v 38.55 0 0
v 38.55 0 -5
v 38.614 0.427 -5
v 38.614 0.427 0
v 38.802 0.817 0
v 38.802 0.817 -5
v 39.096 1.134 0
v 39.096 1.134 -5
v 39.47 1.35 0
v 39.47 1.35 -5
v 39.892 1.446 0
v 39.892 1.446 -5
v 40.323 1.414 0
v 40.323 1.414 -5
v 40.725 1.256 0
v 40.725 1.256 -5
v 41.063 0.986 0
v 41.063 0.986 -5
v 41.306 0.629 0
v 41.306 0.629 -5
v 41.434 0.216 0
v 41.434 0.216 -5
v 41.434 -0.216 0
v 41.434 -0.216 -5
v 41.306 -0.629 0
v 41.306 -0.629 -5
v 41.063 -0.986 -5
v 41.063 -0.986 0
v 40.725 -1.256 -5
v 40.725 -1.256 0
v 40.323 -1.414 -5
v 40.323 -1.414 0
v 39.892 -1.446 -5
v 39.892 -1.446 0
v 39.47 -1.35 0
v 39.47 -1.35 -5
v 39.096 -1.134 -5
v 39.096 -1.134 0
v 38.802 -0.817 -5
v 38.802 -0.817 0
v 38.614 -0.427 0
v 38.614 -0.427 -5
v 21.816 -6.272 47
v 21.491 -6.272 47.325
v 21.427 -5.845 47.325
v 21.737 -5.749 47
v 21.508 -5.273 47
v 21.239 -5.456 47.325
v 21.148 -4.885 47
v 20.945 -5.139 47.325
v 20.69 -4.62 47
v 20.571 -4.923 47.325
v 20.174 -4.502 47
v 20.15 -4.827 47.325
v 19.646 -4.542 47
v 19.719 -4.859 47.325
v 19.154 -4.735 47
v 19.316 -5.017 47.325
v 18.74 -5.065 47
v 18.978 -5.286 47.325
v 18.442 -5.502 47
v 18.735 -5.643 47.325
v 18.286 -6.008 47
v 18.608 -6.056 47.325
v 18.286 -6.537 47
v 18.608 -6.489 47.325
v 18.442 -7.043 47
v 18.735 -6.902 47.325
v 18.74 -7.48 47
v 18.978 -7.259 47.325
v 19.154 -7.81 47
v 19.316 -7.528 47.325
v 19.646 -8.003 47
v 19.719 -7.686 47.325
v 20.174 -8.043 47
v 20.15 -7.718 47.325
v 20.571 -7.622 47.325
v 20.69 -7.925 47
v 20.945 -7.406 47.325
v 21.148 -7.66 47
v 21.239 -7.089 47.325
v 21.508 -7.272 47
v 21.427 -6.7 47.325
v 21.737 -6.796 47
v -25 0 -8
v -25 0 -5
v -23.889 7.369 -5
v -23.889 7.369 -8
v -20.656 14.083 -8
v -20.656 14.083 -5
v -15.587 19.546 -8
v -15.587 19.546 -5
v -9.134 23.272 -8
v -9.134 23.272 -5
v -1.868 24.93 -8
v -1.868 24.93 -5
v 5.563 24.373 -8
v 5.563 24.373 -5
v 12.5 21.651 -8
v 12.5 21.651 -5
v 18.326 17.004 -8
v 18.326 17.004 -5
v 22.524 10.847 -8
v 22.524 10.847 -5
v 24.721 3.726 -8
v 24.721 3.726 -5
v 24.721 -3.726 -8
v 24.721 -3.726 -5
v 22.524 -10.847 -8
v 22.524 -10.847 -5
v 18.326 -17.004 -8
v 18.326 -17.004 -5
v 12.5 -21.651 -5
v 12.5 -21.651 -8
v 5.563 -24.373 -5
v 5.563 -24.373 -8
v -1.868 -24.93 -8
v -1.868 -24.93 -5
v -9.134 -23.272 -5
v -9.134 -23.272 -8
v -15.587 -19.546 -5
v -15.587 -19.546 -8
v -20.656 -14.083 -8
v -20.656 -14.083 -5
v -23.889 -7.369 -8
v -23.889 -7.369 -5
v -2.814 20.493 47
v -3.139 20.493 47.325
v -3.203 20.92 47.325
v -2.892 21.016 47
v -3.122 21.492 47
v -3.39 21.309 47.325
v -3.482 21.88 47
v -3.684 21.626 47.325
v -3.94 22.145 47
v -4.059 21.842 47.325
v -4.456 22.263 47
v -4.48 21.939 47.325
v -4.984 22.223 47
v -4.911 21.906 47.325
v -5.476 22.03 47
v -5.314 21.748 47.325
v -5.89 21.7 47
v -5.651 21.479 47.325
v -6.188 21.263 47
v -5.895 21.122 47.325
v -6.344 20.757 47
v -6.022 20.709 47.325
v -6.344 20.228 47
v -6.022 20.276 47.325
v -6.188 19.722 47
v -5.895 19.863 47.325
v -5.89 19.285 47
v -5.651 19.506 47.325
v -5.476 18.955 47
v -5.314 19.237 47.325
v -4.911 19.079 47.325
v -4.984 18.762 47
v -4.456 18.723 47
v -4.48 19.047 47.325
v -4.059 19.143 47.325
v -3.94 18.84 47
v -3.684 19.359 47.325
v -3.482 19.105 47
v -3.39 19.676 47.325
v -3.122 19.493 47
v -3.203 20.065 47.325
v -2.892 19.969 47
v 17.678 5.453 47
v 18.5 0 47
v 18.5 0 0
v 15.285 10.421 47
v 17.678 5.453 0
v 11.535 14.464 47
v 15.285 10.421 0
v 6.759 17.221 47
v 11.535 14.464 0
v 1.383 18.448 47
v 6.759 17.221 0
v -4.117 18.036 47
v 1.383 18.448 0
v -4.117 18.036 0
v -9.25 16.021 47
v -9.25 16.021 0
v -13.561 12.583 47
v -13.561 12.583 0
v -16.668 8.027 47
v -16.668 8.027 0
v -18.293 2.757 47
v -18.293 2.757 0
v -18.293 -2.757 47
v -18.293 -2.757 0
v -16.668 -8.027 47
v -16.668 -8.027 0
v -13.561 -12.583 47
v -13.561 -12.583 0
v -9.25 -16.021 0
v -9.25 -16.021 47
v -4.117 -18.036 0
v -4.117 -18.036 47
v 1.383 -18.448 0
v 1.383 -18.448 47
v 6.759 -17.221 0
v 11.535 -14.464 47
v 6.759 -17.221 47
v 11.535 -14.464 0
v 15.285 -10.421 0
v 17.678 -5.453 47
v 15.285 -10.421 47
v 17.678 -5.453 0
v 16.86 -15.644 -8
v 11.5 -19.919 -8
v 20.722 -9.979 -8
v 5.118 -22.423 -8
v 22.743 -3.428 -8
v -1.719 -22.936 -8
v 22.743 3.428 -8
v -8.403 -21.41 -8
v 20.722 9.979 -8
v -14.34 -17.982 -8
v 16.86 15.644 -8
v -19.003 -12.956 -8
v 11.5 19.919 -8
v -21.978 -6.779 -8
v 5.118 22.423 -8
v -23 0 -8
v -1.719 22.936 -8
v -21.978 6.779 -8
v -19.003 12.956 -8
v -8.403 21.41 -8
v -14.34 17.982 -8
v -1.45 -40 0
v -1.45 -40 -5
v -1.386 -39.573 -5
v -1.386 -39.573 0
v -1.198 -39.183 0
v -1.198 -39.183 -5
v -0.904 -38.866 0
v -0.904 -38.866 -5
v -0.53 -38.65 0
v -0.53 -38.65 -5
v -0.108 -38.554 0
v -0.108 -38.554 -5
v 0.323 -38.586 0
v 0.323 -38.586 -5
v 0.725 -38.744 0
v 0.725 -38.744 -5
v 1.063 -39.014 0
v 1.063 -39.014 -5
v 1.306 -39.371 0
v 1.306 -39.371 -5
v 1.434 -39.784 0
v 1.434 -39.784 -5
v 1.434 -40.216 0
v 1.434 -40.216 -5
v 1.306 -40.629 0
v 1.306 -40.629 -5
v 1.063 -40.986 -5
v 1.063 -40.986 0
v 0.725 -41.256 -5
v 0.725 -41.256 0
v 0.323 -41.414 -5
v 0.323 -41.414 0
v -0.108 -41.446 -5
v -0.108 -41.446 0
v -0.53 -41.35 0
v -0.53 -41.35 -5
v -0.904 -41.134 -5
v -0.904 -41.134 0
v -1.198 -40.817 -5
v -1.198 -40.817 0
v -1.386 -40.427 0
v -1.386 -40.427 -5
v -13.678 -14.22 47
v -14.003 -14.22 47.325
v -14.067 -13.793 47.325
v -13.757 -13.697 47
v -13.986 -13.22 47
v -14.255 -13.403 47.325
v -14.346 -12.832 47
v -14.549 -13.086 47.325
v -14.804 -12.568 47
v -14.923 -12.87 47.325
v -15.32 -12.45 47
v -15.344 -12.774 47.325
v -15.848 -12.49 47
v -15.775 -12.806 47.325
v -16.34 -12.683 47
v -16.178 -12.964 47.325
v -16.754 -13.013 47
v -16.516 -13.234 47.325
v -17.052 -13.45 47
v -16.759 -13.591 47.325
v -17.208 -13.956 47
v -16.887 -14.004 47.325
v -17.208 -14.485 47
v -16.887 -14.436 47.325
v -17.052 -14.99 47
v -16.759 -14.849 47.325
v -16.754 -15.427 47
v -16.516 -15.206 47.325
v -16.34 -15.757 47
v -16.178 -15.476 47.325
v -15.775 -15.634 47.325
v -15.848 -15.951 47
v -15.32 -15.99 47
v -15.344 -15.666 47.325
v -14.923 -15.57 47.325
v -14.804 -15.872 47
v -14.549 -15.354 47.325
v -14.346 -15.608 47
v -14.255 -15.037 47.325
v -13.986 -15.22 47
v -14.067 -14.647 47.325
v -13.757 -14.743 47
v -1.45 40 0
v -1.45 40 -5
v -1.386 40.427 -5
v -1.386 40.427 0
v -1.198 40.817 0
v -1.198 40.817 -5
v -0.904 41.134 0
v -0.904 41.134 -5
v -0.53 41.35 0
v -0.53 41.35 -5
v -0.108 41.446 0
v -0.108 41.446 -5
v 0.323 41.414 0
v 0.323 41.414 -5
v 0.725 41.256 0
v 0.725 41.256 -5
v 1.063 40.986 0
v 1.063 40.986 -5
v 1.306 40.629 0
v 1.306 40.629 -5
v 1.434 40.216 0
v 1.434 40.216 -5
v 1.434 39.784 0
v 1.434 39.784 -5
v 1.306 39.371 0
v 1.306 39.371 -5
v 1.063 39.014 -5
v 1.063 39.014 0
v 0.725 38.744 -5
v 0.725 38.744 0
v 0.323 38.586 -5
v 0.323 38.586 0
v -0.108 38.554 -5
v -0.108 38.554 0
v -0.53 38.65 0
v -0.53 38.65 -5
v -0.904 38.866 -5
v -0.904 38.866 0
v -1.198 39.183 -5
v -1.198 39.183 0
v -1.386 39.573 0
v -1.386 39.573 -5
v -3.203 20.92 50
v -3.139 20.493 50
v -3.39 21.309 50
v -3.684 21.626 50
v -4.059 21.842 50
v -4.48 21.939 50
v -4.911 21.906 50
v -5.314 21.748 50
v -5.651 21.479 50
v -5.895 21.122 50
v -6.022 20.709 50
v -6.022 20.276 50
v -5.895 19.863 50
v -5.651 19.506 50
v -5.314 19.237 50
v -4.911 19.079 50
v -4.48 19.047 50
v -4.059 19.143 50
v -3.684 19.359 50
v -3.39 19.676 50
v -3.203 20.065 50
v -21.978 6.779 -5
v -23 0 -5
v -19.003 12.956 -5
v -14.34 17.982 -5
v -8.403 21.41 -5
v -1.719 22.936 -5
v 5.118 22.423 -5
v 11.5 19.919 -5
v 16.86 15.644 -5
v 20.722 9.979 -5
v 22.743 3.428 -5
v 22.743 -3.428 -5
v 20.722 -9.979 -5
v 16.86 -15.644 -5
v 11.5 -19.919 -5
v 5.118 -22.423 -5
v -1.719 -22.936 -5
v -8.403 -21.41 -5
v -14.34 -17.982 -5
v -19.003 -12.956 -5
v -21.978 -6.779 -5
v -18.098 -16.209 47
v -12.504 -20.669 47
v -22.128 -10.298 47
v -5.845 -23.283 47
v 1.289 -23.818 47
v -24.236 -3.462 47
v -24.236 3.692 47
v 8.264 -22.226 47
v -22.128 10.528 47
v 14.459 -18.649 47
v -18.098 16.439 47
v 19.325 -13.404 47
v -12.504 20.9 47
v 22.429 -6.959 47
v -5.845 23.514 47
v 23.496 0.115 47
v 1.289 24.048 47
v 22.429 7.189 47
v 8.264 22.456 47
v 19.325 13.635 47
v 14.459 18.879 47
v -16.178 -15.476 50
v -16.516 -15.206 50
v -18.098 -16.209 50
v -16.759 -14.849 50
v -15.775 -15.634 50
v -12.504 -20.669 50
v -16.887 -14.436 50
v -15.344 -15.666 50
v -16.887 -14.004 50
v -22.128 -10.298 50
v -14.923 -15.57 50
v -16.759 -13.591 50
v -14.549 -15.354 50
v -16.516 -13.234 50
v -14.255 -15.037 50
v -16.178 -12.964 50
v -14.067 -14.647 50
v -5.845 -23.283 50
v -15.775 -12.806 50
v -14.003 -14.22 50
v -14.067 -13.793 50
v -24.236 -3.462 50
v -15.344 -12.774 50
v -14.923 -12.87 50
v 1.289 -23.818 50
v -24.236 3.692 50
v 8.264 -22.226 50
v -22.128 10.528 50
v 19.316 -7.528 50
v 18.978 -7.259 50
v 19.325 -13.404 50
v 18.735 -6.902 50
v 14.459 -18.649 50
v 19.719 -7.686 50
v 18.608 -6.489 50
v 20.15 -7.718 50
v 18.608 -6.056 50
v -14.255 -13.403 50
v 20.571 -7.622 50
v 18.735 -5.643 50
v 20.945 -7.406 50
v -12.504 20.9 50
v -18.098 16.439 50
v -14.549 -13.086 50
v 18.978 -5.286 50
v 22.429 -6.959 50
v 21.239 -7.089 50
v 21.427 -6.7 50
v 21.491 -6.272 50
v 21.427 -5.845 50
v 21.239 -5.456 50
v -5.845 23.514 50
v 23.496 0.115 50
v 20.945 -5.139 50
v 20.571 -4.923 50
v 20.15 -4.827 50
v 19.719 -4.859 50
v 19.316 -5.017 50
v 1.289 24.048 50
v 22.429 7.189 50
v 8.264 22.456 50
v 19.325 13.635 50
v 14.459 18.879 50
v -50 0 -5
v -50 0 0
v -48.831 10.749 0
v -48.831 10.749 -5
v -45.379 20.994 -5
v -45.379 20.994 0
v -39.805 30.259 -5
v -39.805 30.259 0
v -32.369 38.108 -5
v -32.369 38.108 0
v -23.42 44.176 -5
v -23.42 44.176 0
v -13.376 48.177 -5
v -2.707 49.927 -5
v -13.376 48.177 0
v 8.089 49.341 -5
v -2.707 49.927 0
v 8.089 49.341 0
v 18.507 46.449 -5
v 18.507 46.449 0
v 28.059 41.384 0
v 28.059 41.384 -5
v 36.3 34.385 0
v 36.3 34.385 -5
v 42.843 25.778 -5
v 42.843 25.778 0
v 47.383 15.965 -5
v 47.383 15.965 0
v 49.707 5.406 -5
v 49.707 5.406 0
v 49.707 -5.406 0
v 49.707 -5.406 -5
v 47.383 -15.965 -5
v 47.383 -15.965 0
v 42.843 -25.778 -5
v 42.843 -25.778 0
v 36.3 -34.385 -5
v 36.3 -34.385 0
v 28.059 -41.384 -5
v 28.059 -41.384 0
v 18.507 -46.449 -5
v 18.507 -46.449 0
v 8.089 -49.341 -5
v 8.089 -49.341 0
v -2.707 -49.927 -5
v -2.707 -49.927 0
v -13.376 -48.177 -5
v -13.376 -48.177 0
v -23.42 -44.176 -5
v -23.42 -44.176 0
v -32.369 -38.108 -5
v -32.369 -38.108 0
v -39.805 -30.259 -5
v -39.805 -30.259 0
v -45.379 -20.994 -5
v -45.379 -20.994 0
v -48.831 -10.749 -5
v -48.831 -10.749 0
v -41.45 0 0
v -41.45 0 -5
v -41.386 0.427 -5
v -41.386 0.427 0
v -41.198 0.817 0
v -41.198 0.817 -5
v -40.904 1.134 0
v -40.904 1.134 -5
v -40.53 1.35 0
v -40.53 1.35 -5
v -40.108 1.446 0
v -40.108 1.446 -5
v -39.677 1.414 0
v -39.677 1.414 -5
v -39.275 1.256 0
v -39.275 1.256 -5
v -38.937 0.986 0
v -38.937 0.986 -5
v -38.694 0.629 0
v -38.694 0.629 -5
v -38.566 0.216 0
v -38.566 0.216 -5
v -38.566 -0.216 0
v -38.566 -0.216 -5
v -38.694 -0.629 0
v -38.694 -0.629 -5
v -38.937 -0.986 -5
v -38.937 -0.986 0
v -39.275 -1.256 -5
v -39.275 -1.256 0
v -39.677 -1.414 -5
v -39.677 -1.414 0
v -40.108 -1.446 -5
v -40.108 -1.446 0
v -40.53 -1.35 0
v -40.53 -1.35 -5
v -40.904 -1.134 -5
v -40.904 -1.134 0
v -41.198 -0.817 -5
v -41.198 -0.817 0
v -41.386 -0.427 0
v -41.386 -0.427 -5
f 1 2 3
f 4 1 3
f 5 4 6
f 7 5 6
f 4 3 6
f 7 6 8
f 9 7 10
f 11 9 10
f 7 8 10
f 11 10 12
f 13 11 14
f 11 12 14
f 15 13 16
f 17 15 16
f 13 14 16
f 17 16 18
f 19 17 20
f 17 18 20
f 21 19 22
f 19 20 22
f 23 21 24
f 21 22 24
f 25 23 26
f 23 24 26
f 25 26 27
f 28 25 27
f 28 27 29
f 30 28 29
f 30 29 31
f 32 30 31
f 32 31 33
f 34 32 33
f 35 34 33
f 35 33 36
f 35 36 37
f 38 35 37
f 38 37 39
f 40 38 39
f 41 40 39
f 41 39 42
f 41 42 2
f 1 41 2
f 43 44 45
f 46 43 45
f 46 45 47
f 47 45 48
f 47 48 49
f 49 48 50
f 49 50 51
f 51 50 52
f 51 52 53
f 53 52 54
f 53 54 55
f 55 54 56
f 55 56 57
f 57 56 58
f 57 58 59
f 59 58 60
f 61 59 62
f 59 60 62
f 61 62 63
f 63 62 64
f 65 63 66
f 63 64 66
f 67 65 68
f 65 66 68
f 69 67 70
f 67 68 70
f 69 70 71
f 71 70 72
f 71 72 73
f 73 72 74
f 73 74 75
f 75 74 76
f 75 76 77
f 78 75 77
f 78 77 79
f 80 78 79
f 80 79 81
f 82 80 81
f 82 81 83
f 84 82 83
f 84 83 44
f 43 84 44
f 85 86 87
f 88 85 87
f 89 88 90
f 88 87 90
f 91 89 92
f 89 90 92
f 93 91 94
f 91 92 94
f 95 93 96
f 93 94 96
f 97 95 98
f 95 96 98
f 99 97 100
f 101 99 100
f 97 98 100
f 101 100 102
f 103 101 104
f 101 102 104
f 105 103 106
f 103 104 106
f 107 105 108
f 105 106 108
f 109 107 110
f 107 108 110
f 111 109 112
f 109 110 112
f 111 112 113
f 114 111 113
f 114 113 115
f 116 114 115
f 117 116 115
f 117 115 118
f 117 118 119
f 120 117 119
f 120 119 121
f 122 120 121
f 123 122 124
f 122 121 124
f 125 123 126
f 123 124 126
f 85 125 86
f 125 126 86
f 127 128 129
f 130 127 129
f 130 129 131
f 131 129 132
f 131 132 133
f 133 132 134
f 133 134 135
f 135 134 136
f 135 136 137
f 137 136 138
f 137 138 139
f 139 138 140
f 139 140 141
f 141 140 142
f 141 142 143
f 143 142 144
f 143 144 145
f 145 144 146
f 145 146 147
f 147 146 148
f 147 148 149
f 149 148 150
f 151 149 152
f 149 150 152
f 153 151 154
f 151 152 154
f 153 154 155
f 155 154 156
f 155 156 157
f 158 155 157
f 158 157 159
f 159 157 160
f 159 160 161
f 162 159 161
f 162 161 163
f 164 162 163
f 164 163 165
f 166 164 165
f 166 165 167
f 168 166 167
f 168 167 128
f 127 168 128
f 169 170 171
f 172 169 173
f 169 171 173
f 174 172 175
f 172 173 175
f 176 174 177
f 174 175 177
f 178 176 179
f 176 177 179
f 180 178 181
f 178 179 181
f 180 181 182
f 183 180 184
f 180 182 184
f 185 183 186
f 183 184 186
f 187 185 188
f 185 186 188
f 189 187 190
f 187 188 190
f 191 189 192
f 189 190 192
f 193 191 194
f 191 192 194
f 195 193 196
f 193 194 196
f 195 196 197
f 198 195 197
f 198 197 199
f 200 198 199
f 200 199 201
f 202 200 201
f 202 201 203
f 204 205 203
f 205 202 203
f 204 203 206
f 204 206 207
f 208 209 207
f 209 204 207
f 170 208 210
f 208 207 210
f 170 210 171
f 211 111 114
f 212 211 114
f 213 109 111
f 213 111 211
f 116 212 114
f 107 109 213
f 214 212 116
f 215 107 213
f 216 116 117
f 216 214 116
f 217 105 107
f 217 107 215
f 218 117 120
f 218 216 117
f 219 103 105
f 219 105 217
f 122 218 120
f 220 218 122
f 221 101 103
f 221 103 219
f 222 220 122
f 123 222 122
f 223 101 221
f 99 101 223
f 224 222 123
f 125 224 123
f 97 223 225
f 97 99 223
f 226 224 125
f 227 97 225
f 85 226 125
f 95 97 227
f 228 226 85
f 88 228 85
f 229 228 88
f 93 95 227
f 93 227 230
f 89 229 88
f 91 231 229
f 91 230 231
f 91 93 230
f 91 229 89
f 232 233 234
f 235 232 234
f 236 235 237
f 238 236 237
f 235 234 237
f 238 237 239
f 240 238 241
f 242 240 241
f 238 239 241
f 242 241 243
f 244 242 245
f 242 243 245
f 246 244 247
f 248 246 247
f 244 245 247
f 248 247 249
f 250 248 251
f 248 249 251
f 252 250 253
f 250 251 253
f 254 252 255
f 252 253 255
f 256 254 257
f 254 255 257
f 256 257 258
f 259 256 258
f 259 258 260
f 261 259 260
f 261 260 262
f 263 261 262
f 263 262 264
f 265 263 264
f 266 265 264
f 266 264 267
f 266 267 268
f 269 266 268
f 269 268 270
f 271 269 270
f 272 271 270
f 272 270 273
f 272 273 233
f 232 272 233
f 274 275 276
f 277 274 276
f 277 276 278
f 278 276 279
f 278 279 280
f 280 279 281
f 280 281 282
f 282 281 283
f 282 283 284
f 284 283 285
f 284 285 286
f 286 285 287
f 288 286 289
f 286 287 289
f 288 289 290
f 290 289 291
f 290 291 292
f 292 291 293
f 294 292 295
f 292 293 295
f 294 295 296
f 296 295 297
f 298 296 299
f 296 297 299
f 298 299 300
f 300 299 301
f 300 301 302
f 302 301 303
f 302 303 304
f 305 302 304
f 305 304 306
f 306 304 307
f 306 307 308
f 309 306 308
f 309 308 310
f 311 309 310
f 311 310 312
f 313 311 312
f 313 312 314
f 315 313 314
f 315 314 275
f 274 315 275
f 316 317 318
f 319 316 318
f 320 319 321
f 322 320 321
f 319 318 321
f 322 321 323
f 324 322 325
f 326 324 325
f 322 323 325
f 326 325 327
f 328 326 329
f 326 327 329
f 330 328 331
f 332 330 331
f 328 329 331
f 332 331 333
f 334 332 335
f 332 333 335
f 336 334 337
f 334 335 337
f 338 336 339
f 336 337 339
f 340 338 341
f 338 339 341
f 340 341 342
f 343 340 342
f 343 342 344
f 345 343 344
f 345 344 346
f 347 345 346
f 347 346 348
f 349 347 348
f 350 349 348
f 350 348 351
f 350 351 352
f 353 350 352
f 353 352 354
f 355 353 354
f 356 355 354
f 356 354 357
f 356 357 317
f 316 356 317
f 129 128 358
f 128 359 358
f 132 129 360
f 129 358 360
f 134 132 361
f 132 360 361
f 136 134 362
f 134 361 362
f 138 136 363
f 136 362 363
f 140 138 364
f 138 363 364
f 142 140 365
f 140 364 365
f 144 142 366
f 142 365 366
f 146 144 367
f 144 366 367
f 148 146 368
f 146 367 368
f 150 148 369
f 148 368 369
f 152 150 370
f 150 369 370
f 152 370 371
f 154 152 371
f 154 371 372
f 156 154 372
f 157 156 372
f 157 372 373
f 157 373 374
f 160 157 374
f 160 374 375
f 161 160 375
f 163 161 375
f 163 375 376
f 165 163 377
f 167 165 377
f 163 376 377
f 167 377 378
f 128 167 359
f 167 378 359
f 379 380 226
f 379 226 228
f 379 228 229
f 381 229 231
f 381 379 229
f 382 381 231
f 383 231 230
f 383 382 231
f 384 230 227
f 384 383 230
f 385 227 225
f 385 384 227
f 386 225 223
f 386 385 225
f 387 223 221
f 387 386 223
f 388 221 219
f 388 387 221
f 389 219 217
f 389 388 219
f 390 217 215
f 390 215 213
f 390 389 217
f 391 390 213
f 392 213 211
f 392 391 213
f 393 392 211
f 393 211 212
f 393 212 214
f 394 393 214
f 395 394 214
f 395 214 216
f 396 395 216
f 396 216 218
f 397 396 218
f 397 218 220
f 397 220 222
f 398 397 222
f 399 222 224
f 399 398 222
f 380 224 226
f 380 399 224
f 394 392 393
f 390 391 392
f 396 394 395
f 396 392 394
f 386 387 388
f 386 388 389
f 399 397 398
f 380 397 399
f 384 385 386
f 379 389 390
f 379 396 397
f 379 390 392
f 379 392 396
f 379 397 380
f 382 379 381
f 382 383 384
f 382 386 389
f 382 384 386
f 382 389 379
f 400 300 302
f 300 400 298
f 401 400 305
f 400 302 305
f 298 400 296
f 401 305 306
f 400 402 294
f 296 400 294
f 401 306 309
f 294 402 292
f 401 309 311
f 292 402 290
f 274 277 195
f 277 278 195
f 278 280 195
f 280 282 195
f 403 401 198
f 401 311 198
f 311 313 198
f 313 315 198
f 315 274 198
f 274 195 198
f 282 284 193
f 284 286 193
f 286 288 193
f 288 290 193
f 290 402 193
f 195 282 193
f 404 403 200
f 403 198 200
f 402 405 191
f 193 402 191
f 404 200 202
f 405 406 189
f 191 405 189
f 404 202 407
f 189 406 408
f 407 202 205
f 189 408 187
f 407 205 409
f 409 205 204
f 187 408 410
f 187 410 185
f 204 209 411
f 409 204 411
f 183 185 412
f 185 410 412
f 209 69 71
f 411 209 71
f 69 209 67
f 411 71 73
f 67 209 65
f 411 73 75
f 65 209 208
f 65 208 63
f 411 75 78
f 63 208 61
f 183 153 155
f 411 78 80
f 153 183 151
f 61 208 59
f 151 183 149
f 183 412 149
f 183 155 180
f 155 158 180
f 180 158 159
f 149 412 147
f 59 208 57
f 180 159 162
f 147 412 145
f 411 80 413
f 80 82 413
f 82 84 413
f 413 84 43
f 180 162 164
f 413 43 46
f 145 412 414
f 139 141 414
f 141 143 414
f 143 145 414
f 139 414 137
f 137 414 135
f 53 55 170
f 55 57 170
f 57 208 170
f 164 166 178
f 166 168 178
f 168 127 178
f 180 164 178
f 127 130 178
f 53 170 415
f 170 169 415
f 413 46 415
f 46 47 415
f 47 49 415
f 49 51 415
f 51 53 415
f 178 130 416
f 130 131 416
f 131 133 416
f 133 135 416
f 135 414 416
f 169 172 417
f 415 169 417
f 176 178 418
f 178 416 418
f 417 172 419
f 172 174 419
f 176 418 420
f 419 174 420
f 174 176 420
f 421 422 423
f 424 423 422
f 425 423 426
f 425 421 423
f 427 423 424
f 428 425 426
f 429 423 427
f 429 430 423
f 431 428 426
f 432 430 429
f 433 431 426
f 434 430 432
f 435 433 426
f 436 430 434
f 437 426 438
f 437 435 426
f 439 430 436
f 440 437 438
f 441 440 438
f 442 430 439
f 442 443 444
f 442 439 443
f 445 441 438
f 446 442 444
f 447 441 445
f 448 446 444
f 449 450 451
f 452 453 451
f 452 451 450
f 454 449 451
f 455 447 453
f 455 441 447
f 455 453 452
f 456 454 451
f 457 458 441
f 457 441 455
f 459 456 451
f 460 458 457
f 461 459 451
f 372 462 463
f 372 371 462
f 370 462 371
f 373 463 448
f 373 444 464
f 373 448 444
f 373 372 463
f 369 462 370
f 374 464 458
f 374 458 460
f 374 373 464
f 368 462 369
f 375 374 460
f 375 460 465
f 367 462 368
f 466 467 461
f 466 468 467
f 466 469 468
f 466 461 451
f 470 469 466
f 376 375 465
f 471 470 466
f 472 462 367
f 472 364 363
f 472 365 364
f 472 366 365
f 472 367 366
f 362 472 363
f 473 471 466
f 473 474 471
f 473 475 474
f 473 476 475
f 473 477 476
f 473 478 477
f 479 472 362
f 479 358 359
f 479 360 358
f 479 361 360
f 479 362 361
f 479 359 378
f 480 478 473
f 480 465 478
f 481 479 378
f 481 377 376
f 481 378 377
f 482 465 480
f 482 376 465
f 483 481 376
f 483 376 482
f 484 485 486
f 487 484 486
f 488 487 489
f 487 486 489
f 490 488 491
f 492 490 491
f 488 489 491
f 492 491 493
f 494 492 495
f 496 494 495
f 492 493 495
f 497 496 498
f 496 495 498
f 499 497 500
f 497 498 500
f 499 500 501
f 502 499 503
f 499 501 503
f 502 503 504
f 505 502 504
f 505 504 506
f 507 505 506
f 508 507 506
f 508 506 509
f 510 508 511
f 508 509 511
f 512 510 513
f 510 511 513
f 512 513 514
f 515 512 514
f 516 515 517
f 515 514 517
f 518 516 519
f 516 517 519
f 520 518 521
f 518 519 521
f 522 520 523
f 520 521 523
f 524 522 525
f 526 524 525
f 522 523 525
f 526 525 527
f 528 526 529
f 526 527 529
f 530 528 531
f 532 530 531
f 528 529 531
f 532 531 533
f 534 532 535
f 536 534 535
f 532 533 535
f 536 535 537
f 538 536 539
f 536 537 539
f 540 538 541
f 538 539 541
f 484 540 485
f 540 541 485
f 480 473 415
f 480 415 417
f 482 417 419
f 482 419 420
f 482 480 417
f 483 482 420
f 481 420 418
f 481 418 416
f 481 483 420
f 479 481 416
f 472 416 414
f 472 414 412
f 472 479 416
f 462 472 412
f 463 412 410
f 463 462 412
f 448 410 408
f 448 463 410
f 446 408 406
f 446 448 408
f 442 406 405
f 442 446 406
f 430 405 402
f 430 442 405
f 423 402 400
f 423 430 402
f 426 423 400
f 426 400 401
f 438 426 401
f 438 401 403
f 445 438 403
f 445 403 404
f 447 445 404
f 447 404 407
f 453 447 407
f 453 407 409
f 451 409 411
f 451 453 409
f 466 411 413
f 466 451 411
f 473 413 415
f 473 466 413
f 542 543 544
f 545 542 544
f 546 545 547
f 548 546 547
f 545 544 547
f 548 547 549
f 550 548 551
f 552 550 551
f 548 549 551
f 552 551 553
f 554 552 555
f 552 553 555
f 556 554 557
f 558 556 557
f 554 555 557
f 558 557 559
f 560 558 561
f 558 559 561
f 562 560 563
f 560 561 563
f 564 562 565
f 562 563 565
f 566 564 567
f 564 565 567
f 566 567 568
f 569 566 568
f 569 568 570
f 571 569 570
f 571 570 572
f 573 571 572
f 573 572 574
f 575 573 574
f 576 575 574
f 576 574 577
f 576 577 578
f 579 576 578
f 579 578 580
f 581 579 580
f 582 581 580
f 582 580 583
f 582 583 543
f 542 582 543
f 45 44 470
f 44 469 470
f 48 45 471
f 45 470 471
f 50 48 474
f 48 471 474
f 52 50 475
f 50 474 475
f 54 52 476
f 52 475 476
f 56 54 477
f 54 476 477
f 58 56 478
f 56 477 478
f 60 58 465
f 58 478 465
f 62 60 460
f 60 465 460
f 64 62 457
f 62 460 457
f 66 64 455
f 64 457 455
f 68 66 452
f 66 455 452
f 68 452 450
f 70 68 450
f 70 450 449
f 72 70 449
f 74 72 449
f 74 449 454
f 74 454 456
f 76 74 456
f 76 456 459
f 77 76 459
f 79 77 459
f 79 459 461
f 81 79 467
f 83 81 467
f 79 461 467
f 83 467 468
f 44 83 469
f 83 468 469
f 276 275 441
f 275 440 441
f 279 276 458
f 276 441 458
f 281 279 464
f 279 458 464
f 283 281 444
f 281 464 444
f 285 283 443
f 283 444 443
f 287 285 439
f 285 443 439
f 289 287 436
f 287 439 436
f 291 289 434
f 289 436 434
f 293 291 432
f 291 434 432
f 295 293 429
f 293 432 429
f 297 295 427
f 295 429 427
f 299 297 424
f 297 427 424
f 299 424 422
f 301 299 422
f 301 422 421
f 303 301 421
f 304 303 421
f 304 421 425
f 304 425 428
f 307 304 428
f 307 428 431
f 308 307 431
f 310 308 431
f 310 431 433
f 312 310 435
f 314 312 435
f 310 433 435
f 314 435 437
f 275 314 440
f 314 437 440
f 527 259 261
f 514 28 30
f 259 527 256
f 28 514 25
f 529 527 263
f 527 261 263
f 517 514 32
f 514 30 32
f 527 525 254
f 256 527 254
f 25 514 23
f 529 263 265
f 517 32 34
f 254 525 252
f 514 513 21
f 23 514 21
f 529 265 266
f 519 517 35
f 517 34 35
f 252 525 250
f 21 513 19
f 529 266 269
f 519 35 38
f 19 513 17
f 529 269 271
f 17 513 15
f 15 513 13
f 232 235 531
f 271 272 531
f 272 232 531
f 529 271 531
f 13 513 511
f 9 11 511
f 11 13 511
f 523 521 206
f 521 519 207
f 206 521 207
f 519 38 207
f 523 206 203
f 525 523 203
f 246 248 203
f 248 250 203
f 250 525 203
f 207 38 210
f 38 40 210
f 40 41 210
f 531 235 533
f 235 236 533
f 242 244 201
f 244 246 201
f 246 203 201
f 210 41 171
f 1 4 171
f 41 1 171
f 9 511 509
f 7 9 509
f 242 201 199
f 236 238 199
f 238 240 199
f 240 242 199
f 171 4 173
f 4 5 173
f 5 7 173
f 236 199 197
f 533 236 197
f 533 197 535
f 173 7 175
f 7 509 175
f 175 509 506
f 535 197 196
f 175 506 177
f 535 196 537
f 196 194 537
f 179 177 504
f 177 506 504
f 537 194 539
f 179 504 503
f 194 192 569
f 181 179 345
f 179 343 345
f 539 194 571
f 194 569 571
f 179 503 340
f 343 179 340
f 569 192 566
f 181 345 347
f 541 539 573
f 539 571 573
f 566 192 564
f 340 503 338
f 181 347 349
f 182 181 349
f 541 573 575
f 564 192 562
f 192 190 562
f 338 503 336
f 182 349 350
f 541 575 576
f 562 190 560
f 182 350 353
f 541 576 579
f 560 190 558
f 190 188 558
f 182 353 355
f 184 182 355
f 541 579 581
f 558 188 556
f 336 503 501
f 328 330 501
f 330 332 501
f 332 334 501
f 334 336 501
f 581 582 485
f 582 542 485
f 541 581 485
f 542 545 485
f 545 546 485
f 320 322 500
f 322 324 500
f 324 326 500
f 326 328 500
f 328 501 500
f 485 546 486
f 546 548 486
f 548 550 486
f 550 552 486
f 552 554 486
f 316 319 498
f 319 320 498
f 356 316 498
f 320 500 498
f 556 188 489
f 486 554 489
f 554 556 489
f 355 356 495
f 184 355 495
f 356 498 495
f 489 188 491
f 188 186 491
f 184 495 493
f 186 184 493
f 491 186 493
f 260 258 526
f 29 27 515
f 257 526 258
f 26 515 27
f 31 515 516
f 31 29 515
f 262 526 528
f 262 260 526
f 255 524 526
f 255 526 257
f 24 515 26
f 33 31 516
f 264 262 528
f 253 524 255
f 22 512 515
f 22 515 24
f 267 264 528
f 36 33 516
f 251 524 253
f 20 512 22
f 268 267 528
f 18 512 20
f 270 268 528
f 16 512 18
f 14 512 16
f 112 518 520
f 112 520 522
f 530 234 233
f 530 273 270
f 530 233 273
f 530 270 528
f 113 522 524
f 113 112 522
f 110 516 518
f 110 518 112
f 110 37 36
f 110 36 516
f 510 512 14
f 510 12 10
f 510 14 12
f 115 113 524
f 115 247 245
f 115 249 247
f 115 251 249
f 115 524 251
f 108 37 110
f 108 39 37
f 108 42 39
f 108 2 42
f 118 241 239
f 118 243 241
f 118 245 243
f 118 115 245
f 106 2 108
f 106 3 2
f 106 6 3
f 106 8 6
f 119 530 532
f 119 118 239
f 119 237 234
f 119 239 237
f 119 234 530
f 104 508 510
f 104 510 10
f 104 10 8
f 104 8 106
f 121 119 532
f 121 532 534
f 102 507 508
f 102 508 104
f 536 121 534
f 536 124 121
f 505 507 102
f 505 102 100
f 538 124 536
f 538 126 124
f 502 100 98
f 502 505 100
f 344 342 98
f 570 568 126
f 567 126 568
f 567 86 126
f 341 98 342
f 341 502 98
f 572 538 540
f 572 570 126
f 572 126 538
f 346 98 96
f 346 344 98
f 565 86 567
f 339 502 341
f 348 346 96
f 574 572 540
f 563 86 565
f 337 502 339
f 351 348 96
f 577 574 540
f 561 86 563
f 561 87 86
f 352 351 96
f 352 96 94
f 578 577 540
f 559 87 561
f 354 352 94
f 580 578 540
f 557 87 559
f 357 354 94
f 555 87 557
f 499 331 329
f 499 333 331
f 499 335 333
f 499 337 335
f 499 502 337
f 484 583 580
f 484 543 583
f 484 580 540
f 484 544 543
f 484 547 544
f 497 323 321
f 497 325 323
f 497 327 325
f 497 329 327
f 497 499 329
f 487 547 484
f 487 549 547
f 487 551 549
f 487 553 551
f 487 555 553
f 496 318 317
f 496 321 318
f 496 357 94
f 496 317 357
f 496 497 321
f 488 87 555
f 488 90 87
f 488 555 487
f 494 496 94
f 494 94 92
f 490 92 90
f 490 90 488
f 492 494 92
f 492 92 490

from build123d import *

# Parameters (mm, degrees)
SKETCH_1_R                     = 18.5
EXTRUDE_1_DEPTH                = 50
SKETCH_2_R                     = 50
EXTRUDE_2_DEPTH                = 5
SKETCH_3_R                     = 25
SKETCH_3_R_2                   = 23
EXTRUDE_3_DEPTH                = 3
SKETCH_4_R                     = 1.45
CUT_EXTRUDE_1_DEPTH            = 23
SKETCH_5_R                     = 24
EXTRUDE_4_DEPTH                = 3
HOLE_WIZARD_M3_5_3_D           = 2.9
HOLE_WIZARD_M3_5_3_DEPTH       = 10
HOLE_WIZARD_M3_5_3_CSINK_D     = 3.55
HOLE_WIZARD_M3_5_3_CSINK_ANGLE = 90
HOLE_WIZARD_M3_5_3_TIP         = 0.871247898


with BuildPart() as part:
    # 스케치1 → 보스-돌출1 (new body)
    with BuildSketch(Plane.XY):
        Circle(SKETCH_1_R)
    extrude(amount=EXTRUDE_1_DEPTH)

    # 스케치2 → 보스-돌출2 (add)
    with BuildSketch(Plane(origin=(0, 0, 0), x_dir=(-1, 0, 0), z_dir=(0, 0, -1))):
        Circle(SKETCH_2_R)
    extrude(amount=EXTRUDE_2_DEPTH)

    # 스케치3 → 보스-돌출3 (add)
    with BuildSketch(Plane(origin=(0, 0, -5), x_dir=(-1, 0, 0), z_dir=(0, 0, -1))):
        Circle(SKETCH_3_R)
        Circle(SKETCH_3_R_2, mode=Mode.SUBTRACT)
    extrude(amount=EXTRUDE_3_DEPTH)

    # 스케치4 → 컷-돌출1 (cut)
    with BuildSketch(Plane(origin=(0, 0, -5), x_dir=(-1, 0, 0), z_dir=(0, 0, -1))):
        with Locations((-40, 0)):
            Circle(SKETCH_4_R)
        with Locations((0, 40)):
            Circle(SKETCH_4_R)
        with Locations((40, 0)):
            Circle(SKETCH_4_R)
        with Locations((0, -40)):
            Circle(SKETCH_4_R)
    extrude(amount=-CUT_EXTRUDE_1_DEPTH, mode=Mode.SUBTRACT)

    # 스케치5 → 보스-돌출4 (add)
    with BuildSketch(Plane.XY.offset(50)):
        with Locations((-0.504488898, 0.115254903)):
            Circle(SKETCH_5_R)
    extrude(amount=-EXTRUDE_4_DEPTH)

    # M3.5 나사 구멍3
    with Locations(Plane(origin=(0, 0, 47), x_dir=(-1, 0, 0), z_dir=(0, 0, -1))):
        with Locations((4.588537545, 20.492567511), (15.452815281, -14.220073836), (-20.041352826, -6.272493675)):
            CounterSinkHole(HOLE_WIZARD_M3_5_3_D / 2, HOLE_WIZARD_M3_5_3_CSINK_D / 2, depth=HOLE_WIZARD_M3_5_3_DEPTH, counter_sink_angle=HOLE_WIZARD_M3_5_3_CSINK_ANGLE)
            with Locations((0, 0, -(HOLE_WIZARD_M3_5_3_DEPTH + HOLE_WIZARD_M3_5_3_TIP / 2))):  # 118° drill point
                Cone(0, HOLE_WIZARD_M3_5_3_D / 2, HOLE_WIZARD_M3_5_3_TIP, mode=Mode.SUBTRACT)


solid = part.part
